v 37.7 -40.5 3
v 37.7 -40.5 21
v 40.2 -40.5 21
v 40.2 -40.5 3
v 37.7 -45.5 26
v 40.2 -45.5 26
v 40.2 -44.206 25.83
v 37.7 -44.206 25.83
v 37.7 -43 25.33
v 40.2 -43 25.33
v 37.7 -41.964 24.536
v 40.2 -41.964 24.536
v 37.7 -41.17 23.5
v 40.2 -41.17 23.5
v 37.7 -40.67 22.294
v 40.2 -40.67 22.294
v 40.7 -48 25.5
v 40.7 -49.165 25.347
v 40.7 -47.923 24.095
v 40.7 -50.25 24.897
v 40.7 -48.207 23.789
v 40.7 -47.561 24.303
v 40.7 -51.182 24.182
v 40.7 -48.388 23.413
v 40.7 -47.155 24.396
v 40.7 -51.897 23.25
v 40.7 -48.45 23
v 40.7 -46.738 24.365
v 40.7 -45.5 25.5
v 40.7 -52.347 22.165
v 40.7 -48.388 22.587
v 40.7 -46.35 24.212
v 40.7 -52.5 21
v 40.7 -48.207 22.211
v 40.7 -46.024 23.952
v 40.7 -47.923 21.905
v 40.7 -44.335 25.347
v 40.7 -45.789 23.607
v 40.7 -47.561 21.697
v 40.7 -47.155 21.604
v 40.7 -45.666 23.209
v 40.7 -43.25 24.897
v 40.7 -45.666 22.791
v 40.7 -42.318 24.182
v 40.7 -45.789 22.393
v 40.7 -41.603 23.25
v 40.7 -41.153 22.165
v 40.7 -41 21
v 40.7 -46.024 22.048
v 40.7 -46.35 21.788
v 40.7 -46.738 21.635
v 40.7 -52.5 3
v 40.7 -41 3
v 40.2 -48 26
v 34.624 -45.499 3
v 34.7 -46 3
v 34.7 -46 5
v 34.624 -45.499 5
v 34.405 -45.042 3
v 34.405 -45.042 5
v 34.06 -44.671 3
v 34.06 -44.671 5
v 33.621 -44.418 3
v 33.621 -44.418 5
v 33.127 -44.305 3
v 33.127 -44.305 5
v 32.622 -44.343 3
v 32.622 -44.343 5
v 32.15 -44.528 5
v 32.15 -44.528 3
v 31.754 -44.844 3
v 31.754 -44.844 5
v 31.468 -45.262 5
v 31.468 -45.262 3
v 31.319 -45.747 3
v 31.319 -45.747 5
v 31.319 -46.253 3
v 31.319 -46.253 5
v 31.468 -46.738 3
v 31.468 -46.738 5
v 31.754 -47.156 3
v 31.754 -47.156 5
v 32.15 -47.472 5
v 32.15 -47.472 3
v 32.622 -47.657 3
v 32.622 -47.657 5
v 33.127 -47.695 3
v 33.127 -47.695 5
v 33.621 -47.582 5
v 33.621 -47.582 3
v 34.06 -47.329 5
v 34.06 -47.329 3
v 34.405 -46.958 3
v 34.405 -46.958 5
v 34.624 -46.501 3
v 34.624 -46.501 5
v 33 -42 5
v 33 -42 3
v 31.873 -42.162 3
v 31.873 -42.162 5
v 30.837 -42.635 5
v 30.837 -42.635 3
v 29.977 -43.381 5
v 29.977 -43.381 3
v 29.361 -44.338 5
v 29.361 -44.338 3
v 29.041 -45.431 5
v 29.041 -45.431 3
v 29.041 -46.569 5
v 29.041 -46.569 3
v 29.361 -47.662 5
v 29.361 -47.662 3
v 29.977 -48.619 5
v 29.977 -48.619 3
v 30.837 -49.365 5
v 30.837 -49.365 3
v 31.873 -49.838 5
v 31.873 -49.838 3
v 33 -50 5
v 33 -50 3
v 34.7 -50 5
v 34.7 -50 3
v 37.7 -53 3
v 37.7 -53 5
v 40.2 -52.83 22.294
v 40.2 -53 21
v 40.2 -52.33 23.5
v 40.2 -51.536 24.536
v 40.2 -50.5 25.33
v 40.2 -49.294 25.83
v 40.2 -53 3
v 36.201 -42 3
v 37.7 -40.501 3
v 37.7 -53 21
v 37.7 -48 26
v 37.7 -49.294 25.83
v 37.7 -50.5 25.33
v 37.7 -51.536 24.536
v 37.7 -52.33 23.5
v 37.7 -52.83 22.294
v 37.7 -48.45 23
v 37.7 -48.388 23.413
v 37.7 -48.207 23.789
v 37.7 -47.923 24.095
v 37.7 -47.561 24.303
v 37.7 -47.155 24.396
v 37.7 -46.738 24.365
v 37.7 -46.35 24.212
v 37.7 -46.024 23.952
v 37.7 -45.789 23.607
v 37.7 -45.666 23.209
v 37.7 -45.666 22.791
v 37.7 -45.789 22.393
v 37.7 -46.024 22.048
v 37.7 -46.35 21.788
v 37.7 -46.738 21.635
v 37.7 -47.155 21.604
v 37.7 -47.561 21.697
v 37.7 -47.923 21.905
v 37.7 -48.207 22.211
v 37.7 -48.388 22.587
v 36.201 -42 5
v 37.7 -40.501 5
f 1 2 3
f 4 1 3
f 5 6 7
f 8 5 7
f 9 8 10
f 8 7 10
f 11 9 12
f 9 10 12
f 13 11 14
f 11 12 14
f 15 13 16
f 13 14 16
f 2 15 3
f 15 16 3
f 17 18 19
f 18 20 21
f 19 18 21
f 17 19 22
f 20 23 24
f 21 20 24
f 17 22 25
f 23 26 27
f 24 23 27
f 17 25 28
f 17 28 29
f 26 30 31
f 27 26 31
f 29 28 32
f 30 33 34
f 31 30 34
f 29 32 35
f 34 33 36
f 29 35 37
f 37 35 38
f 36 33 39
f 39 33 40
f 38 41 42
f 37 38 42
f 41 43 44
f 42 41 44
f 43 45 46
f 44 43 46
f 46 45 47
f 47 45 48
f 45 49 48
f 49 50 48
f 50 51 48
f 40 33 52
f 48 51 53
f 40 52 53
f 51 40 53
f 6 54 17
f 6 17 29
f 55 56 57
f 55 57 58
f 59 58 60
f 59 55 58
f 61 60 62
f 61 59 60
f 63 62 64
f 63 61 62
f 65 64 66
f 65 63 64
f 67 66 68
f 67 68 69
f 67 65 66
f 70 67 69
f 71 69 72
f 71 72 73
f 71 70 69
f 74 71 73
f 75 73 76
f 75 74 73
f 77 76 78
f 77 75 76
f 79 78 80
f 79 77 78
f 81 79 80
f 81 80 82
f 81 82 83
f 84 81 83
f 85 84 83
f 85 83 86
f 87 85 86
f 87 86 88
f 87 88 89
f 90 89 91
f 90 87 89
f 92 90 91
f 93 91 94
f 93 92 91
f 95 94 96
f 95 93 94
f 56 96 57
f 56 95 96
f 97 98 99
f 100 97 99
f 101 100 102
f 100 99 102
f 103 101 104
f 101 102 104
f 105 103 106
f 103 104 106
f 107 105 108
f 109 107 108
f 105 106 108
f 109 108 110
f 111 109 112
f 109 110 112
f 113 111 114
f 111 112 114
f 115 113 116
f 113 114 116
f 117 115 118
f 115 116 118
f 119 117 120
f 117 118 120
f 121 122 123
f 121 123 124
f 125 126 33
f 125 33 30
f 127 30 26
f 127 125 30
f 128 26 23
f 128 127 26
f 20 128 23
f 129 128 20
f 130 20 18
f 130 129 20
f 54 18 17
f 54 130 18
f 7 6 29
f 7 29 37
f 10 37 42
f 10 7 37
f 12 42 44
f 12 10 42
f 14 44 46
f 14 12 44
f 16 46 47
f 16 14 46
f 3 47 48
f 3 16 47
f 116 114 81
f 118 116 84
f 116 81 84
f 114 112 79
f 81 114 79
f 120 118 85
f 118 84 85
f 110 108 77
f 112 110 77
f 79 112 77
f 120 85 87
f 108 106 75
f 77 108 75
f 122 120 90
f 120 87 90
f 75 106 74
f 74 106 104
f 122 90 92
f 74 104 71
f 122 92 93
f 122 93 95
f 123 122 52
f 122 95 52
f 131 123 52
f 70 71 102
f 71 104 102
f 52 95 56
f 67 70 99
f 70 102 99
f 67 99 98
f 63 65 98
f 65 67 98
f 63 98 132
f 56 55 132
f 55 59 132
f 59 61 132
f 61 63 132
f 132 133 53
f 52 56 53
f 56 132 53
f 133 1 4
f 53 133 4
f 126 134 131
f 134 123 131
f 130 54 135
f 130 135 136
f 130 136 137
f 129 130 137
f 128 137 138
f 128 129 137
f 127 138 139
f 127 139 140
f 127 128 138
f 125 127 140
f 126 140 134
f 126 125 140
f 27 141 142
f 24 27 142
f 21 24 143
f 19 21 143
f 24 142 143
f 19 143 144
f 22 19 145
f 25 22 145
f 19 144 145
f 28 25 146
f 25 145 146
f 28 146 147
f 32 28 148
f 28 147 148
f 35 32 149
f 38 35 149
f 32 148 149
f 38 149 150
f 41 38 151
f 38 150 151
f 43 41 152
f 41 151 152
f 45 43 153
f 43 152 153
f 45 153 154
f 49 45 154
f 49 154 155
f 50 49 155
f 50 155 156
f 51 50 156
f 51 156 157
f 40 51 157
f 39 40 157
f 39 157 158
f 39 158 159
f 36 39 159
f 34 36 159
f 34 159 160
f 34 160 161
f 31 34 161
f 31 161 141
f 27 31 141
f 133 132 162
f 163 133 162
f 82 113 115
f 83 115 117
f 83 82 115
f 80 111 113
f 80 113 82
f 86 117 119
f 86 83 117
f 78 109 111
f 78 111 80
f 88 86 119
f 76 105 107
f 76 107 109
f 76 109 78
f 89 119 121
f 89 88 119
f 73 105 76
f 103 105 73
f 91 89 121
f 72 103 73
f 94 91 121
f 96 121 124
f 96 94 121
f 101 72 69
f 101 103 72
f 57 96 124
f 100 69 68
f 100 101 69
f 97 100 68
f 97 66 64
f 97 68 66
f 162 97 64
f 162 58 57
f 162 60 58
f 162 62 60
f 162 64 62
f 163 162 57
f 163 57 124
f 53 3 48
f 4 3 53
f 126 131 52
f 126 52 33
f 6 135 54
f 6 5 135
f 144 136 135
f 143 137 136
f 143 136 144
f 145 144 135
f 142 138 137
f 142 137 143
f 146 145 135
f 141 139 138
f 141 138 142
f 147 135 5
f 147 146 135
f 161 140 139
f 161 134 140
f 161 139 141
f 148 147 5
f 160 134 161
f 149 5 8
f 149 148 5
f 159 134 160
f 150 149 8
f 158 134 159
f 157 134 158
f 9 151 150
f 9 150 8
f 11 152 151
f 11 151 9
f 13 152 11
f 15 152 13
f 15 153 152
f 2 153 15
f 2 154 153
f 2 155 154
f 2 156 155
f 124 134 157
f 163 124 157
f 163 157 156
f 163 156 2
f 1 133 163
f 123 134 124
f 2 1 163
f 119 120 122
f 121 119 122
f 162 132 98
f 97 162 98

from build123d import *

# Parameters (mm, degrees)
SKETCH011_R     = 1.7
PAD007_DEPTH    = 2
SKETCH012_W     = 3
SKETCH012_H     = 12.5
PAD008_DEPTH    = 21
SKETCH013_R     = 1.4
POCKET004_DEPTH = 5
FILLET007_R     = 5
CHAMFER003_SIZE = 1.499
CHAMFER004_SIZE = 2.9999
CHAMFER005_SIZE = 0.5


with BuildPart() as part:
    # Sketch011 → Pad007 (new body)
    with BuildSketch(Plane.XY):
        with BuildLine():
            Line((0, -4), (4.7, -4))
            Line((4.7, -7), (4.7, -4))
            Line((7.7, -7), (4.7, -7))
            Line((7.7, -7), (7.7, 5.5))
            Line((4.7, 5.5), (7.7, 5.5))
            Line((4.7, 4), (4.7, 5.5))
            Line((4.7, 4), (0, 4))
            ThreePointArc((0, 4), (-4, 0), (0, -4))
        make_face()
        Circle(SKETCH011_R, mode=Mode.SUBTRACT)
    extrude(amount=PAD007_DEPTH)

    # Sketch012 (on Face11 of Pad007) → Pad008 (join)
    with BuildSketch(Plane.XY.offset(2)):
        with Locations((6.2, -0.75)):
            Rectangle(SKETCH012_W, SKETCH012_H)
    extrude(amount=PAD008_DEPTH)

    # Sketch013 (on Face7 of Pad008) → Pocket004 (cut)
    with BuildSketch(Plane(origin=(4.7, 0, 0), x_dir=(0, -1, 0), z_dir=(-1, 0, 0))):
        with Locations((1.05, 20)):
            Circle(SKETCH013_R)
    extrude(amount=-POCKET004_DEPTH, mode=Mode.SUBTRACT)

    # Fillet007
    fillet007_edges = [part.edges().sort_by_distance(p)[0] for p in [
        (6.2, 5.5, 23),
        (6.2, -7, 23),
    ]]
    fillet(fillet007_edges, radius=FILLET007_R)

    # Chamfer003
    chamfer003_edges = [part.edges().sort_by_distance(p)[0] for p in [
        (4.7, 4, 1),
    ]]
    chamfer(chamfer003_edges, length=CHAMFER003_SIZE)

    # Chamfer004
    chamfer004_edges = [part.edges().sort_by_distance(p)[0] for p in [
        (4.7, -4, 1),
    ]]
    chamfer(chamfer004_edges, length=CHAMFER004_SIZE)

    # Chamfer005
    chamfer005_edges = [part.edges().sort_by_distance(p)[0] for p in [
        (7.7, 5.5, 10),
    ]]
    chamfer(chamfer005_edges, length=CHAMFER005_SIZE)


with BuildPart() as part_1:
    # Body006 placement: moved
    add(part.part.moved(Location((33, -46, 3))))


solid = part_1.part
